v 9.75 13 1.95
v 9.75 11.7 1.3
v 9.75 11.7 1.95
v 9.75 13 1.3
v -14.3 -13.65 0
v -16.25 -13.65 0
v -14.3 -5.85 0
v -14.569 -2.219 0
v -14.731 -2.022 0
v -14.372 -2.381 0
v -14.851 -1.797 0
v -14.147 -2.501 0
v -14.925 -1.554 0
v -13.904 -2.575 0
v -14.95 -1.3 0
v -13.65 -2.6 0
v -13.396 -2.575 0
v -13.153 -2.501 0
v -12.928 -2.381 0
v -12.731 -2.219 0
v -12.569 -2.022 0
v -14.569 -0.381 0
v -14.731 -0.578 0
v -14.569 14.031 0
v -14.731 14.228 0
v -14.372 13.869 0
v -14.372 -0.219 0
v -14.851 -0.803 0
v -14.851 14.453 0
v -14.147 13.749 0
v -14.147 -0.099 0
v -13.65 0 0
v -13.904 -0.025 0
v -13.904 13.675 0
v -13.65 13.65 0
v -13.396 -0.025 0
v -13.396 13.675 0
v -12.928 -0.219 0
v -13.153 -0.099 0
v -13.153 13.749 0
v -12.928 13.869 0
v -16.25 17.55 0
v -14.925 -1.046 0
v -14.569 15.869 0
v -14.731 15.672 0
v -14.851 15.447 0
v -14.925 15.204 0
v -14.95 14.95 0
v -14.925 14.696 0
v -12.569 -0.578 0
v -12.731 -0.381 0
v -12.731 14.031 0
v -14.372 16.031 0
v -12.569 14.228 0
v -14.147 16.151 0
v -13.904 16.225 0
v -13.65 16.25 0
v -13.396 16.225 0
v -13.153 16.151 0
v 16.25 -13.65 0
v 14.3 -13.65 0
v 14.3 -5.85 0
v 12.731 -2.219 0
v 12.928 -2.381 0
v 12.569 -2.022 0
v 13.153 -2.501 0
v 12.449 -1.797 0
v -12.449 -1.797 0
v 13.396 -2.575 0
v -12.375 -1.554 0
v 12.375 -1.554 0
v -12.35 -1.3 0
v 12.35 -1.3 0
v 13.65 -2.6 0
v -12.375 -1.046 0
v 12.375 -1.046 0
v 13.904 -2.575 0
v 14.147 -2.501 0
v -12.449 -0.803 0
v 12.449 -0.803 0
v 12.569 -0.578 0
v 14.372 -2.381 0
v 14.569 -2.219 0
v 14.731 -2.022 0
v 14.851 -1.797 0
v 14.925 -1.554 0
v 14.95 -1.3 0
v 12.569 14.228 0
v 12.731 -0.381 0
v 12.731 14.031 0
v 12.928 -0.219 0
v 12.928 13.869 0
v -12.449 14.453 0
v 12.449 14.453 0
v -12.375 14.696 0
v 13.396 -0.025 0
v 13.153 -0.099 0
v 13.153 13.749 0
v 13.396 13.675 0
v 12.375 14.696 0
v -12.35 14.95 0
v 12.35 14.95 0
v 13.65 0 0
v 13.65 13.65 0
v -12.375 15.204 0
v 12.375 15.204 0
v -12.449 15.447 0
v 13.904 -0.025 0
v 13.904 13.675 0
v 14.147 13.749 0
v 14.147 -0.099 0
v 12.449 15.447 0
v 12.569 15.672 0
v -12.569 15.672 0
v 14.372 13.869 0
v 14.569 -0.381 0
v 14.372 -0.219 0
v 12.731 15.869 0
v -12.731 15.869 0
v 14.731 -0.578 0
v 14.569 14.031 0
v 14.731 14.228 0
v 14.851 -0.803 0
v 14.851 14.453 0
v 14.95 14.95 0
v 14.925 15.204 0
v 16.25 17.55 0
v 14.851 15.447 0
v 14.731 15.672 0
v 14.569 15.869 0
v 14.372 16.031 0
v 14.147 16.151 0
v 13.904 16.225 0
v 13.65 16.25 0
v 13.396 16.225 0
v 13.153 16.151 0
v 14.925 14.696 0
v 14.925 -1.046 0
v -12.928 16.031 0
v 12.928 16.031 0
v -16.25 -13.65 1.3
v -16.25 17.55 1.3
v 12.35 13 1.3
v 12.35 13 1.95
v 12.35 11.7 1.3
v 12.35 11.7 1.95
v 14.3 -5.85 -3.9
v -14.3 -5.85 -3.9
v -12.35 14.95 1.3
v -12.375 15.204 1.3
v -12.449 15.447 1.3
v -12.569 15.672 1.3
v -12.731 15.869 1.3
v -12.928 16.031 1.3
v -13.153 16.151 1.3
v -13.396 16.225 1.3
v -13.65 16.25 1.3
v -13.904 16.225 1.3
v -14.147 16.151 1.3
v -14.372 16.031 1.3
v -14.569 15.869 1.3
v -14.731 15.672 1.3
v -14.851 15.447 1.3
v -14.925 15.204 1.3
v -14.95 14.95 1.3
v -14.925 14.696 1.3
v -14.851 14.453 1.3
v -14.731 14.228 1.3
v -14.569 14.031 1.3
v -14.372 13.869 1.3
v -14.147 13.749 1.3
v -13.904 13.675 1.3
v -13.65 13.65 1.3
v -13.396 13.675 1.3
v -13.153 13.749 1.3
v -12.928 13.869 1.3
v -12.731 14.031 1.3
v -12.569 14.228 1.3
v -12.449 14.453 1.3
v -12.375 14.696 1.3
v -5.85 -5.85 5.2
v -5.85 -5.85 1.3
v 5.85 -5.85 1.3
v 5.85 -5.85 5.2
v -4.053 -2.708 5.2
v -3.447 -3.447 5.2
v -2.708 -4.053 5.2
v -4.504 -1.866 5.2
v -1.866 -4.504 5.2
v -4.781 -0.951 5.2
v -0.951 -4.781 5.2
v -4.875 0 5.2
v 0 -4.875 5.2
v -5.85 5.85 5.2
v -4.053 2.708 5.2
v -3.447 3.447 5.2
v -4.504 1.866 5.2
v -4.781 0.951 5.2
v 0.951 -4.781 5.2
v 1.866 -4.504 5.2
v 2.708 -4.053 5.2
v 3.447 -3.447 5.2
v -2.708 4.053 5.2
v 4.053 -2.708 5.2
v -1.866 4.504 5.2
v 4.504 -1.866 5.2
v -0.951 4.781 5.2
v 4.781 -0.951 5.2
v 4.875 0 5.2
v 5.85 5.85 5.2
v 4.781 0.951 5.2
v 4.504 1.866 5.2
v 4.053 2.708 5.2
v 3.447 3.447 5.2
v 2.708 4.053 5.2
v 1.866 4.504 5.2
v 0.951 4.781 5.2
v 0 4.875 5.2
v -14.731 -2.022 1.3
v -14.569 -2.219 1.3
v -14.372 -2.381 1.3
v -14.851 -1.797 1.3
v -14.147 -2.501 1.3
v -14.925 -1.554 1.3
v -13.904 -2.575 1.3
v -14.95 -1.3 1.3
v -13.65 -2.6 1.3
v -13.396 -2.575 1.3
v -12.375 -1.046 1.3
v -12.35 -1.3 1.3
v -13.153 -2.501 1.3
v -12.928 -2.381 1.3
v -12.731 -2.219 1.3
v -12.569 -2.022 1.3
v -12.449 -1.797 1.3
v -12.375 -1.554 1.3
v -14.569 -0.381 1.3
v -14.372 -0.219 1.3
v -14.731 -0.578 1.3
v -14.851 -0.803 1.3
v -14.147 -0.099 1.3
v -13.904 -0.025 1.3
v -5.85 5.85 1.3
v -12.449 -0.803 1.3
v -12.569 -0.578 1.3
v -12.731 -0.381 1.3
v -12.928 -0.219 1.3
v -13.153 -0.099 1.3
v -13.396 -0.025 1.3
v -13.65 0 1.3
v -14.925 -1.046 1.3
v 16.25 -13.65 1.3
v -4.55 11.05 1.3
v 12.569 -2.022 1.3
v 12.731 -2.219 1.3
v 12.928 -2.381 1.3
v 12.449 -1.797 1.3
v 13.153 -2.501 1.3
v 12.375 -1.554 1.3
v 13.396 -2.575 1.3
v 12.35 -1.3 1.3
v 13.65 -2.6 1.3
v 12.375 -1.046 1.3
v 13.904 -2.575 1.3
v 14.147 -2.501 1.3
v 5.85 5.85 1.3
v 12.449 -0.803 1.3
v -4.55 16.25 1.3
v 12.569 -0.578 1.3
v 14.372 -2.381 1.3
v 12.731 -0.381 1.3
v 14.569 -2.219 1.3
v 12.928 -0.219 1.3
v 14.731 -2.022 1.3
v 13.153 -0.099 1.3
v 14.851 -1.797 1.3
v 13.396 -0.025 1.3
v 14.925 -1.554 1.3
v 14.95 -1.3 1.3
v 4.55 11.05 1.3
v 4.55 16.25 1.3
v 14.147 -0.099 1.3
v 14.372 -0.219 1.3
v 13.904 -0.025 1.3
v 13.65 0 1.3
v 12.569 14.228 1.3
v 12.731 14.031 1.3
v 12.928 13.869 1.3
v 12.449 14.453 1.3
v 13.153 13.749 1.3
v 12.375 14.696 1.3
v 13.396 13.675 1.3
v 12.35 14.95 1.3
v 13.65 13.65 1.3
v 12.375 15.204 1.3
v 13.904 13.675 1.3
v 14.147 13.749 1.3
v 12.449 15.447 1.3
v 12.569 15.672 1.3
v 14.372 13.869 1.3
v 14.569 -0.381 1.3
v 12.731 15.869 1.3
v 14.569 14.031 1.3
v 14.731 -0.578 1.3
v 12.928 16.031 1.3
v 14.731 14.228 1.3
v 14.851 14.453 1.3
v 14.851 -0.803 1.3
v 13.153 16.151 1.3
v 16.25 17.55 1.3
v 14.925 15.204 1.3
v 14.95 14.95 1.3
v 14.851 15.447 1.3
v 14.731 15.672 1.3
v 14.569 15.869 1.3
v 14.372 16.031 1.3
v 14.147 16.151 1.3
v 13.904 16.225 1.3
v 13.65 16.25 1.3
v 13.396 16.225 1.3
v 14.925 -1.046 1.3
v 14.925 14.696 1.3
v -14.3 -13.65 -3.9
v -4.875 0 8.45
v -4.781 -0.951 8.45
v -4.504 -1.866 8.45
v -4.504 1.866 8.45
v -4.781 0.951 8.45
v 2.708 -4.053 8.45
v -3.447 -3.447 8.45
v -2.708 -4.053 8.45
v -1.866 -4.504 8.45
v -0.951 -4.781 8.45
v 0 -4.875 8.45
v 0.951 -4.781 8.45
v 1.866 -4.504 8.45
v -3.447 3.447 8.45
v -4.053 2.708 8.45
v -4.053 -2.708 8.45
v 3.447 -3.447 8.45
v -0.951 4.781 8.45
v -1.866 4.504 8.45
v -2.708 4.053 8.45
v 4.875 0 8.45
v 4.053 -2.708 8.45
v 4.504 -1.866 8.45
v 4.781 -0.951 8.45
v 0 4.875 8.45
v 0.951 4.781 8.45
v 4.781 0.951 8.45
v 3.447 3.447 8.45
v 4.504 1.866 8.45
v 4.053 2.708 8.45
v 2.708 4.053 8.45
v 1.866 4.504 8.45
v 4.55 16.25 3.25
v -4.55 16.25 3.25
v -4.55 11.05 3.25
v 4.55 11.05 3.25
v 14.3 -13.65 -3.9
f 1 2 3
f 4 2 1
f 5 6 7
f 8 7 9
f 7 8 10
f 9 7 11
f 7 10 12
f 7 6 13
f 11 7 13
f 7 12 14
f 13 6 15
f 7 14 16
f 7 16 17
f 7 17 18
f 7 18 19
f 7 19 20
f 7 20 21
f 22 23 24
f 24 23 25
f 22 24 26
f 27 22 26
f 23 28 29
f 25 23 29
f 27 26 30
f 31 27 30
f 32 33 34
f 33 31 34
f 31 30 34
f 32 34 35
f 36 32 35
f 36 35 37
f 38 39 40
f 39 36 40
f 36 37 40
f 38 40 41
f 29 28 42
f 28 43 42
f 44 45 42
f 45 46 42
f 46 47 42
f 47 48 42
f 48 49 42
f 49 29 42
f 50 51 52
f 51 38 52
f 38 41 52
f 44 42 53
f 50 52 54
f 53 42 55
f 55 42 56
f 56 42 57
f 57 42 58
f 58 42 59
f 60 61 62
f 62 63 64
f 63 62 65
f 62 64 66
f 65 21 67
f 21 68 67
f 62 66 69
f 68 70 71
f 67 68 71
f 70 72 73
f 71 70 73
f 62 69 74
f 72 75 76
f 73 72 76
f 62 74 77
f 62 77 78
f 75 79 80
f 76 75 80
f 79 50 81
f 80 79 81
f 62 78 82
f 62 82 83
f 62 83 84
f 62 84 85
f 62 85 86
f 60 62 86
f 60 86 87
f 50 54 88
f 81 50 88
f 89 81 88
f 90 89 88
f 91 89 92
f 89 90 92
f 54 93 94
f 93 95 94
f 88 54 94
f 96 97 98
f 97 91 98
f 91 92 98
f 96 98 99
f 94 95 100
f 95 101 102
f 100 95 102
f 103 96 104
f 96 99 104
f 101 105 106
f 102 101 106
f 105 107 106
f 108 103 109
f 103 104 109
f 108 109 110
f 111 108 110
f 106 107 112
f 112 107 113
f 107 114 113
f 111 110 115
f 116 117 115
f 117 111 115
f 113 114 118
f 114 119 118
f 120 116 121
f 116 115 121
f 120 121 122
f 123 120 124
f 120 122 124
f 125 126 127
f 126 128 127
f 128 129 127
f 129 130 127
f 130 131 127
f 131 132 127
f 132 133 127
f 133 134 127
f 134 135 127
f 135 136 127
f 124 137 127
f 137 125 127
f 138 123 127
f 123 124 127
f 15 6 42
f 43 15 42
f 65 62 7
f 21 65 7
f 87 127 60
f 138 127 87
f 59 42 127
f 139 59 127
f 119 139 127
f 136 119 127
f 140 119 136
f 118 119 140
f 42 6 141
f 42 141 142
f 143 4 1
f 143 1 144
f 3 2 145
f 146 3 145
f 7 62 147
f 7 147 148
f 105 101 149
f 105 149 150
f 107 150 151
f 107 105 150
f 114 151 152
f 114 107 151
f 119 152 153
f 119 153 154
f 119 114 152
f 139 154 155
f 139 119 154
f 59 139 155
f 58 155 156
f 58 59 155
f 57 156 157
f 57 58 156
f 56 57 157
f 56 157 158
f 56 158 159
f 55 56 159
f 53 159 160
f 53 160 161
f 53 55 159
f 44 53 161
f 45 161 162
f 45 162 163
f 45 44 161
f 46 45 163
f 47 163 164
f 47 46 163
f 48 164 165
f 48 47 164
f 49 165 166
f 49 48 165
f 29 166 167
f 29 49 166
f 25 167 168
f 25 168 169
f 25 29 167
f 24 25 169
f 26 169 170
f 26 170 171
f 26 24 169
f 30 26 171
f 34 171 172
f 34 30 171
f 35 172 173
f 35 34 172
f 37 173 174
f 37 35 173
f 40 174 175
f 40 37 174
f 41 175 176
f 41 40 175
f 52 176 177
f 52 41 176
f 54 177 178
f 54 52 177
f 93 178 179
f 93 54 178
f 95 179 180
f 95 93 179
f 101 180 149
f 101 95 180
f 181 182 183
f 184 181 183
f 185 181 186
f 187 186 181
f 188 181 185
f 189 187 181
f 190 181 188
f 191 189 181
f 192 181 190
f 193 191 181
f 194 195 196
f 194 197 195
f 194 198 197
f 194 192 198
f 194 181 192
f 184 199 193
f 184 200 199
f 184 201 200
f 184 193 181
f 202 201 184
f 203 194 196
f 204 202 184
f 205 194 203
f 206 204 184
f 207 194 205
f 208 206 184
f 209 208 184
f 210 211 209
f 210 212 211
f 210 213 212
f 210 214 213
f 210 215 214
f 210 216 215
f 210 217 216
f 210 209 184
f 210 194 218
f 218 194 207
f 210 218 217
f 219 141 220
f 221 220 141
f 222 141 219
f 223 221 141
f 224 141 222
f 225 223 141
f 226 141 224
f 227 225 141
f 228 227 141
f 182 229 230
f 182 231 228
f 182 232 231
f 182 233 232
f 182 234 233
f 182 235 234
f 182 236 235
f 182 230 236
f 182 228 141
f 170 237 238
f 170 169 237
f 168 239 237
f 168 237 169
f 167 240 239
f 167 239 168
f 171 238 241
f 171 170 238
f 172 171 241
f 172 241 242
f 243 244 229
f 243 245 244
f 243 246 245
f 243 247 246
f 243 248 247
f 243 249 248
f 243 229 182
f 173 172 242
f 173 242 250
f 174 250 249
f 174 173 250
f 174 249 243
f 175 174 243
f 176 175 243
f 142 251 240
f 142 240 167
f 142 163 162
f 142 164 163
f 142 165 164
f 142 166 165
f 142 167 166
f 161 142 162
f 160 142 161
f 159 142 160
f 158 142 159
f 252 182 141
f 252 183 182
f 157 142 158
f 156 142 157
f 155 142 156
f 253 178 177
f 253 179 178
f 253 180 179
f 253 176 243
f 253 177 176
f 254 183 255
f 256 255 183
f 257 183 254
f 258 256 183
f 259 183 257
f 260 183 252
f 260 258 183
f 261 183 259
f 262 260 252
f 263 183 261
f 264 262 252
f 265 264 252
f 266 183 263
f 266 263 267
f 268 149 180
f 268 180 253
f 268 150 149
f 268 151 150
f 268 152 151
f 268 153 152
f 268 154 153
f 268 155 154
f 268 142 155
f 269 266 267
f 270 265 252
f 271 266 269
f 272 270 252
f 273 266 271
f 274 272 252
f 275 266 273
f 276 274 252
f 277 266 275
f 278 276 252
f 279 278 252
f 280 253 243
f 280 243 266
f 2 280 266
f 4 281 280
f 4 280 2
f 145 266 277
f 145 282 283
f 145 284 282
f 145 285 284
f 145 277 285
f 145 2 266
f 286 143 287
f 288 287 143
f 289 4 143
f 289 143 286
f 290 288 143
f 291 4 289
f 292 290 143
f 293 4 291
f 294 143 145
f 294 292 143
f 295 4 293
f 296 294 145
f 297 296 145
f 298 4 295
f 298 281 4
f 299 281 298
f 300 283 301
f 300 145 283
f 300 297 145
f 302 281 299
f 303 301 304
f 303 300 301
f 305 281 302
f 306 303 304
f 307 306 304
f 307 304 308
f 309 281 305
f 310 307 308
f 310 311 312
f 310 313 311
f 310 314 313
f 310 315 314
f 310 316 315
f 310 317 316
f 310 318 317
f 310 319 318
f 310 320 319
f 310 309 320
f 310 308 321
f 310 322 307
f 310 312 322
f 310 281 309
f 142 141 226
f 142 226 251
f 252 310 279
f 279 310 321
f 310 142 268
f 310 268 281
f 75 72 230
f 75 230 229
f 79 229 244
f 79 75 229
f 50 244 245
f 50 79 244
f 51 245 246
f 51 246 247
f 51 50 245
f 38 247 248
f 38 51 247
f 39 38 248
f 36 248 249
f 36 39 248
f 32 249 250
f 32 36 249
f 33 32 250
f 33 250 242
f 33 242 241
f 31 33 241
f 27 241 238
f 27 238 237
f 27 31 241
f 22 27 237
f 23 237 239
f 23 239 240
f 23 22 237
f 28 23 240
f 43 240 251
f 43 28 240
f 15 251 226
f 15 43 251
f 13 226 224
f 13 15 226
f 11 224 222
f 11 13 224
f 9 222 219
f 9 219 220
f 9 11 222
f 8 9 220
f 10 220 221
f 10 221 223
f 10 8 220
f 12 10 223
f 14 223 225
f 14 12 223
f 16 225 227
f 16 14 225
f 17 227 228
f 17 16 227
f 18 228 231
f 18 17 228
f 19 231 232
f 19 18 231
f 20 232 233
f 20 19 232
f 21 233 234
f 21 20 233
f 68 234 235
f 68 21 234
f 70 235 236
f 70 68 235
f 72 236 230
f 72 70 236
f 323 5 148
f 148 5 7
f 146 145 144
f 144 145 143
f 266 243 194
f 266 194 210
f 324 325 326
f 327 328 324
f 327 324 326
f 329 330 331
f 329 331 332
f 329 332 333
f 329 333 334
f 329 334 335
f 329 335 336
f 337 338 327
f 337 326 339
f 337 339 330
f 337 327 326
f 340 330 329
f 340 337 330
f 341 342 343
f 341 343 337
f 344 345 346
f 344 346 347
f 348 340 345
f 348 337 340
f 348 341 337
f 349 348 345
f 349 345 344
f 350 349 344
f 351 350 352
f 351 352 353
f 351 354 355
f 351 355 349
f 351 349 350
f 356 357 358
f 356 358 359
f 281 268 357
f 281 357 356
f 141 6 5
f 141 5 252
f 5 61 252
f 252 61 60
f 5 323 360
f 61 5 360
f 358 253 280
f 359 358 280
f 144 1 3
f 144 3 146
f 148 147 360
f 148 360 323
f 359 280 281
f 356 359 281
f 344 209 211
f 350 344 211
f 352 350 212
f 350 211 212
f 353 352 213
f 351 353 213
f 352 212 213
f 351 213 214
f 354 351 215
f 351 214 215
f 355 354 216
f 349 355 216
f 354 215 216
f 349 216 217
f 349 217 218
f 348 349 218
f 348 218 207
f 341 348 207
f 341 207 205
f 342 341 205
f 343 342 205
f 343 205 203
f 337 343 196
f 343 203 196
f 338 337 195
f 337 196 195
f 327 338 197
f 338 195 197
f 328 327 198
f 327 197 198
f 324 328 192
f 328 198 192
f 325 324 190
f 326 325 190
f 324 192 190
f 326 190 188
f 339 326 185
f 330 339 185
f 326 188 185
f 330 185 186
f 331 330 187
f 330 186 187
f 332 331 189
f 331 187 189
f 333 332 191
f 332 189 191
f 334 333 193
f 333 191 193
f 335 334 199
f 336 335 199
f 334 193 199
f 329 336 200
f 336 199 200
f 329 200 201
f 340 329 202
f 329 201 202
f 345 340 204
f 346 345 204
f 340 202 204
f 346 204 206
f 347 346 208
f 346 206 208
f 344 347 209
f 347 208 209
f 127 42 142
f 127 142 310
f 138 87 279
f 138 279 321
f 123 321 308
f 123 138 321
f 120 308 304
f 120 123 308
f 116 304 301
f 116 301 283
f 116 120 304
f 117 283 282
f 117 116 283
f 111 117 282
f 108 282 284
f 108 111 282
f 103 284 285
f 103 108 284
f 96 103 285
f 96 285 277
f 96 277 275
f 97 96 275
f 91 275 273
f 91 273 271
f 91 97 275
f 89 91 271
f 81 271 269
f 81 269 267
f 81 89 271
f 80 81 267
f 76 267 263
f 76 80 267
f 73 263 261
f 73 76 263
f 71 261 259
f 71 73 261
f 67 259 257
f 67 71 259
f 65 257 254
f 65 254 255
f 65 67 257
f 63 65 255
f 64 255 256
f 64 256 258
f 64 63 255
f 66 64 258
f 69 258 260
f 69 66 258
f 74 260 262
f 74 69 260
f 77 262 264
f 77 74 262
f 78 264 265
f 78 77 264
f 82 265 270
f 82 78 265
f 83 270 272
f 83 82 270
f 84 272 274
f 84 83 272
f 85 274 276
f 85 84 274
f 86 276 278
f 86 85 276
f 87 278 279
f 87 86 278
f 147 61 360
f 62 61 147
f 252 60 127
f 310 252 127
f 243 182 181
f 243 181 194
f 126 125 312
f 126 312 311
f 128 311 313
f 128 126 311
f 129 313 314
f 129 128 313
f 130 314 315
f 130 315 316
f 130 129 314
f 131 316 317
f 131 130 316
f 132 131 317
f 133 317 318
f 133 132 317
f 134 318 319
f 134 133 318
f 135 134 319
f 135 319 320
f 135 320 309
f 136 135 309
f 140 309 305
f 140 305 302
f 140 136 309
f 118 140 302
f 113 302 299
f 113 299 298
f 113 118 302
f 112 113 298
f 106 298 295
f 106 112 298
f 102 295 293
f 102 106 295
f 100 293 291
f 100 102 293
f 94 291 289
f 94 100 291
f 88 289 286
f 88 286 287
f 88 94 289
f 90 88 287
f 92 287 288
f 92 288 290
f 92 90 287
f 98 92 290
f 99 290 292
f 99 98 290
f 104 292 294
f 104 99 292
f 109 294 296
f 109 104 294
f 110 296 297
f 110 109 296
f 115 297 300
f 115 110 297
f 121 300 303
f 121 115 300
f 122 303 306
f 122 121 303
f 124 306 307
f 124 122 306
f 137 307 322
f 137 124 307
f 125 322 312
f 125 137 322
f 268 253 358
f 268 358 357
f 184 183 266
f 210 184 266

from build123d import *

# Parameters (mm, degrees)
CROQUIS1_W              = 25
CROQUIS1_H              = 24
CROQUIS1_R              = 1
SALIENTE_EXTRUIR1_DEPTH = 1
CROQUIS1_3_W            = 2
CROQUIS1_3_H            = 1
SALIENTE_EXTRUIR2_DEPTH = 1.5
CROQUIS1_4_W            = 7
CROQUIS1_4_H            = 4
SALIENTE_EXTRUIR3_DEPTH = 2.5
CROQUIS1_5_W            = 9
CROQUIS1_5_H            = 9
SALIENTE_EXTRUIR4_DEPTH = 4
CROQUIS3_R              = 3.75
SALIENTE_EXTRUIR5_DEPTH = 2.5
CROQUIS4_W              = 22
CROQUIS4_H              = 6
SALIENTE_EXTRUIR6_DEPTH = 3
SCALE1_SCALE            = 1.3


with BuildPart() as part:
    # Croquis1 → Saliente-Extruir1 (new body)
    with BuildSketch(Plane.XY):
        with Locations((0, 1.5)):
            Rectangle(CROQUIS1_W, CROQUIS1_H)
        with Locations((-10.5, -1)):
            Circle(CROQUIS1_R, mode=Mode.SUBTRACT)
        with Locations((10.5, -1)):
            Circle(CROQUIS1_R, mode=Mode.SUBTRACT)
        with Locations((-10.5, 11.5)):
            Circle(CROQUIS1_R, mode=Mode.SUBTRACT)
        with Locations((10.5, 11.5)):
            Circle(CROQUIS1_R, mode=Mode.SUBTRACT)
    extrude(amount=SALIENTE_EXTRUIR1_DEPTH)

    # Croquis1<3> → Saliente-Extruir2 (add)
    with BuildSketch(Plane.XY):
        with Locations((8.5, 9.5)):
            Rectangle(CROQUIS1_3_W, CROQUIS1_3_H)
    extrude(amount=SALIENTE_EXTRUIR2_DEPTH)

    # Croquis1<4> → Saliente-Extruir3 (add)
    with BuildSketch(Plane.XY):
        with Locations((0, 10.5)):
            Rectangle(CROQUIS1_4_W, CROQUIS1_4_H)
    extrude(amount=SALIENTE_EXTRUIR3_DEPTH)

    # Croquis1<5> → Saliente-Extruir4 (add)
    with BuildSketch(Plane.XY):
        Rectangle(CROQUIS1_5_W, CROQUIS1_5_H)
    extrude(amount=SALIENTE_EXTRUIR4_DEPTH)

    # Croquis3 → Saliente-Extruir5 (add)
    with BuildSketch(Plane.XY.offset(4)):
        Circle(CROQUIS3_R)
    extrude(amount=SALIENTE_EXTRUIR5_DEPTH)

    # Croquis4 → Saliente-Extruir6 (add)
    with BuildSketch(Plane(origin=(0, 0, 0), x_dir=(-1, 0, 0), z_dir=(0, 0, -1))):
        with Locations((0, -7.5)):
            Rectangle(CROQUIS4_W, CROQUIS4_H)
    extrude(amount=SALIENTE_EXTRUIR6_DEPTH)


with BuildPart() as part_1:
    # Scale1: scaled about (0, 0, 0)
    add(part.part.scale(SCALE1_SCALE))


solid = part_1.part
